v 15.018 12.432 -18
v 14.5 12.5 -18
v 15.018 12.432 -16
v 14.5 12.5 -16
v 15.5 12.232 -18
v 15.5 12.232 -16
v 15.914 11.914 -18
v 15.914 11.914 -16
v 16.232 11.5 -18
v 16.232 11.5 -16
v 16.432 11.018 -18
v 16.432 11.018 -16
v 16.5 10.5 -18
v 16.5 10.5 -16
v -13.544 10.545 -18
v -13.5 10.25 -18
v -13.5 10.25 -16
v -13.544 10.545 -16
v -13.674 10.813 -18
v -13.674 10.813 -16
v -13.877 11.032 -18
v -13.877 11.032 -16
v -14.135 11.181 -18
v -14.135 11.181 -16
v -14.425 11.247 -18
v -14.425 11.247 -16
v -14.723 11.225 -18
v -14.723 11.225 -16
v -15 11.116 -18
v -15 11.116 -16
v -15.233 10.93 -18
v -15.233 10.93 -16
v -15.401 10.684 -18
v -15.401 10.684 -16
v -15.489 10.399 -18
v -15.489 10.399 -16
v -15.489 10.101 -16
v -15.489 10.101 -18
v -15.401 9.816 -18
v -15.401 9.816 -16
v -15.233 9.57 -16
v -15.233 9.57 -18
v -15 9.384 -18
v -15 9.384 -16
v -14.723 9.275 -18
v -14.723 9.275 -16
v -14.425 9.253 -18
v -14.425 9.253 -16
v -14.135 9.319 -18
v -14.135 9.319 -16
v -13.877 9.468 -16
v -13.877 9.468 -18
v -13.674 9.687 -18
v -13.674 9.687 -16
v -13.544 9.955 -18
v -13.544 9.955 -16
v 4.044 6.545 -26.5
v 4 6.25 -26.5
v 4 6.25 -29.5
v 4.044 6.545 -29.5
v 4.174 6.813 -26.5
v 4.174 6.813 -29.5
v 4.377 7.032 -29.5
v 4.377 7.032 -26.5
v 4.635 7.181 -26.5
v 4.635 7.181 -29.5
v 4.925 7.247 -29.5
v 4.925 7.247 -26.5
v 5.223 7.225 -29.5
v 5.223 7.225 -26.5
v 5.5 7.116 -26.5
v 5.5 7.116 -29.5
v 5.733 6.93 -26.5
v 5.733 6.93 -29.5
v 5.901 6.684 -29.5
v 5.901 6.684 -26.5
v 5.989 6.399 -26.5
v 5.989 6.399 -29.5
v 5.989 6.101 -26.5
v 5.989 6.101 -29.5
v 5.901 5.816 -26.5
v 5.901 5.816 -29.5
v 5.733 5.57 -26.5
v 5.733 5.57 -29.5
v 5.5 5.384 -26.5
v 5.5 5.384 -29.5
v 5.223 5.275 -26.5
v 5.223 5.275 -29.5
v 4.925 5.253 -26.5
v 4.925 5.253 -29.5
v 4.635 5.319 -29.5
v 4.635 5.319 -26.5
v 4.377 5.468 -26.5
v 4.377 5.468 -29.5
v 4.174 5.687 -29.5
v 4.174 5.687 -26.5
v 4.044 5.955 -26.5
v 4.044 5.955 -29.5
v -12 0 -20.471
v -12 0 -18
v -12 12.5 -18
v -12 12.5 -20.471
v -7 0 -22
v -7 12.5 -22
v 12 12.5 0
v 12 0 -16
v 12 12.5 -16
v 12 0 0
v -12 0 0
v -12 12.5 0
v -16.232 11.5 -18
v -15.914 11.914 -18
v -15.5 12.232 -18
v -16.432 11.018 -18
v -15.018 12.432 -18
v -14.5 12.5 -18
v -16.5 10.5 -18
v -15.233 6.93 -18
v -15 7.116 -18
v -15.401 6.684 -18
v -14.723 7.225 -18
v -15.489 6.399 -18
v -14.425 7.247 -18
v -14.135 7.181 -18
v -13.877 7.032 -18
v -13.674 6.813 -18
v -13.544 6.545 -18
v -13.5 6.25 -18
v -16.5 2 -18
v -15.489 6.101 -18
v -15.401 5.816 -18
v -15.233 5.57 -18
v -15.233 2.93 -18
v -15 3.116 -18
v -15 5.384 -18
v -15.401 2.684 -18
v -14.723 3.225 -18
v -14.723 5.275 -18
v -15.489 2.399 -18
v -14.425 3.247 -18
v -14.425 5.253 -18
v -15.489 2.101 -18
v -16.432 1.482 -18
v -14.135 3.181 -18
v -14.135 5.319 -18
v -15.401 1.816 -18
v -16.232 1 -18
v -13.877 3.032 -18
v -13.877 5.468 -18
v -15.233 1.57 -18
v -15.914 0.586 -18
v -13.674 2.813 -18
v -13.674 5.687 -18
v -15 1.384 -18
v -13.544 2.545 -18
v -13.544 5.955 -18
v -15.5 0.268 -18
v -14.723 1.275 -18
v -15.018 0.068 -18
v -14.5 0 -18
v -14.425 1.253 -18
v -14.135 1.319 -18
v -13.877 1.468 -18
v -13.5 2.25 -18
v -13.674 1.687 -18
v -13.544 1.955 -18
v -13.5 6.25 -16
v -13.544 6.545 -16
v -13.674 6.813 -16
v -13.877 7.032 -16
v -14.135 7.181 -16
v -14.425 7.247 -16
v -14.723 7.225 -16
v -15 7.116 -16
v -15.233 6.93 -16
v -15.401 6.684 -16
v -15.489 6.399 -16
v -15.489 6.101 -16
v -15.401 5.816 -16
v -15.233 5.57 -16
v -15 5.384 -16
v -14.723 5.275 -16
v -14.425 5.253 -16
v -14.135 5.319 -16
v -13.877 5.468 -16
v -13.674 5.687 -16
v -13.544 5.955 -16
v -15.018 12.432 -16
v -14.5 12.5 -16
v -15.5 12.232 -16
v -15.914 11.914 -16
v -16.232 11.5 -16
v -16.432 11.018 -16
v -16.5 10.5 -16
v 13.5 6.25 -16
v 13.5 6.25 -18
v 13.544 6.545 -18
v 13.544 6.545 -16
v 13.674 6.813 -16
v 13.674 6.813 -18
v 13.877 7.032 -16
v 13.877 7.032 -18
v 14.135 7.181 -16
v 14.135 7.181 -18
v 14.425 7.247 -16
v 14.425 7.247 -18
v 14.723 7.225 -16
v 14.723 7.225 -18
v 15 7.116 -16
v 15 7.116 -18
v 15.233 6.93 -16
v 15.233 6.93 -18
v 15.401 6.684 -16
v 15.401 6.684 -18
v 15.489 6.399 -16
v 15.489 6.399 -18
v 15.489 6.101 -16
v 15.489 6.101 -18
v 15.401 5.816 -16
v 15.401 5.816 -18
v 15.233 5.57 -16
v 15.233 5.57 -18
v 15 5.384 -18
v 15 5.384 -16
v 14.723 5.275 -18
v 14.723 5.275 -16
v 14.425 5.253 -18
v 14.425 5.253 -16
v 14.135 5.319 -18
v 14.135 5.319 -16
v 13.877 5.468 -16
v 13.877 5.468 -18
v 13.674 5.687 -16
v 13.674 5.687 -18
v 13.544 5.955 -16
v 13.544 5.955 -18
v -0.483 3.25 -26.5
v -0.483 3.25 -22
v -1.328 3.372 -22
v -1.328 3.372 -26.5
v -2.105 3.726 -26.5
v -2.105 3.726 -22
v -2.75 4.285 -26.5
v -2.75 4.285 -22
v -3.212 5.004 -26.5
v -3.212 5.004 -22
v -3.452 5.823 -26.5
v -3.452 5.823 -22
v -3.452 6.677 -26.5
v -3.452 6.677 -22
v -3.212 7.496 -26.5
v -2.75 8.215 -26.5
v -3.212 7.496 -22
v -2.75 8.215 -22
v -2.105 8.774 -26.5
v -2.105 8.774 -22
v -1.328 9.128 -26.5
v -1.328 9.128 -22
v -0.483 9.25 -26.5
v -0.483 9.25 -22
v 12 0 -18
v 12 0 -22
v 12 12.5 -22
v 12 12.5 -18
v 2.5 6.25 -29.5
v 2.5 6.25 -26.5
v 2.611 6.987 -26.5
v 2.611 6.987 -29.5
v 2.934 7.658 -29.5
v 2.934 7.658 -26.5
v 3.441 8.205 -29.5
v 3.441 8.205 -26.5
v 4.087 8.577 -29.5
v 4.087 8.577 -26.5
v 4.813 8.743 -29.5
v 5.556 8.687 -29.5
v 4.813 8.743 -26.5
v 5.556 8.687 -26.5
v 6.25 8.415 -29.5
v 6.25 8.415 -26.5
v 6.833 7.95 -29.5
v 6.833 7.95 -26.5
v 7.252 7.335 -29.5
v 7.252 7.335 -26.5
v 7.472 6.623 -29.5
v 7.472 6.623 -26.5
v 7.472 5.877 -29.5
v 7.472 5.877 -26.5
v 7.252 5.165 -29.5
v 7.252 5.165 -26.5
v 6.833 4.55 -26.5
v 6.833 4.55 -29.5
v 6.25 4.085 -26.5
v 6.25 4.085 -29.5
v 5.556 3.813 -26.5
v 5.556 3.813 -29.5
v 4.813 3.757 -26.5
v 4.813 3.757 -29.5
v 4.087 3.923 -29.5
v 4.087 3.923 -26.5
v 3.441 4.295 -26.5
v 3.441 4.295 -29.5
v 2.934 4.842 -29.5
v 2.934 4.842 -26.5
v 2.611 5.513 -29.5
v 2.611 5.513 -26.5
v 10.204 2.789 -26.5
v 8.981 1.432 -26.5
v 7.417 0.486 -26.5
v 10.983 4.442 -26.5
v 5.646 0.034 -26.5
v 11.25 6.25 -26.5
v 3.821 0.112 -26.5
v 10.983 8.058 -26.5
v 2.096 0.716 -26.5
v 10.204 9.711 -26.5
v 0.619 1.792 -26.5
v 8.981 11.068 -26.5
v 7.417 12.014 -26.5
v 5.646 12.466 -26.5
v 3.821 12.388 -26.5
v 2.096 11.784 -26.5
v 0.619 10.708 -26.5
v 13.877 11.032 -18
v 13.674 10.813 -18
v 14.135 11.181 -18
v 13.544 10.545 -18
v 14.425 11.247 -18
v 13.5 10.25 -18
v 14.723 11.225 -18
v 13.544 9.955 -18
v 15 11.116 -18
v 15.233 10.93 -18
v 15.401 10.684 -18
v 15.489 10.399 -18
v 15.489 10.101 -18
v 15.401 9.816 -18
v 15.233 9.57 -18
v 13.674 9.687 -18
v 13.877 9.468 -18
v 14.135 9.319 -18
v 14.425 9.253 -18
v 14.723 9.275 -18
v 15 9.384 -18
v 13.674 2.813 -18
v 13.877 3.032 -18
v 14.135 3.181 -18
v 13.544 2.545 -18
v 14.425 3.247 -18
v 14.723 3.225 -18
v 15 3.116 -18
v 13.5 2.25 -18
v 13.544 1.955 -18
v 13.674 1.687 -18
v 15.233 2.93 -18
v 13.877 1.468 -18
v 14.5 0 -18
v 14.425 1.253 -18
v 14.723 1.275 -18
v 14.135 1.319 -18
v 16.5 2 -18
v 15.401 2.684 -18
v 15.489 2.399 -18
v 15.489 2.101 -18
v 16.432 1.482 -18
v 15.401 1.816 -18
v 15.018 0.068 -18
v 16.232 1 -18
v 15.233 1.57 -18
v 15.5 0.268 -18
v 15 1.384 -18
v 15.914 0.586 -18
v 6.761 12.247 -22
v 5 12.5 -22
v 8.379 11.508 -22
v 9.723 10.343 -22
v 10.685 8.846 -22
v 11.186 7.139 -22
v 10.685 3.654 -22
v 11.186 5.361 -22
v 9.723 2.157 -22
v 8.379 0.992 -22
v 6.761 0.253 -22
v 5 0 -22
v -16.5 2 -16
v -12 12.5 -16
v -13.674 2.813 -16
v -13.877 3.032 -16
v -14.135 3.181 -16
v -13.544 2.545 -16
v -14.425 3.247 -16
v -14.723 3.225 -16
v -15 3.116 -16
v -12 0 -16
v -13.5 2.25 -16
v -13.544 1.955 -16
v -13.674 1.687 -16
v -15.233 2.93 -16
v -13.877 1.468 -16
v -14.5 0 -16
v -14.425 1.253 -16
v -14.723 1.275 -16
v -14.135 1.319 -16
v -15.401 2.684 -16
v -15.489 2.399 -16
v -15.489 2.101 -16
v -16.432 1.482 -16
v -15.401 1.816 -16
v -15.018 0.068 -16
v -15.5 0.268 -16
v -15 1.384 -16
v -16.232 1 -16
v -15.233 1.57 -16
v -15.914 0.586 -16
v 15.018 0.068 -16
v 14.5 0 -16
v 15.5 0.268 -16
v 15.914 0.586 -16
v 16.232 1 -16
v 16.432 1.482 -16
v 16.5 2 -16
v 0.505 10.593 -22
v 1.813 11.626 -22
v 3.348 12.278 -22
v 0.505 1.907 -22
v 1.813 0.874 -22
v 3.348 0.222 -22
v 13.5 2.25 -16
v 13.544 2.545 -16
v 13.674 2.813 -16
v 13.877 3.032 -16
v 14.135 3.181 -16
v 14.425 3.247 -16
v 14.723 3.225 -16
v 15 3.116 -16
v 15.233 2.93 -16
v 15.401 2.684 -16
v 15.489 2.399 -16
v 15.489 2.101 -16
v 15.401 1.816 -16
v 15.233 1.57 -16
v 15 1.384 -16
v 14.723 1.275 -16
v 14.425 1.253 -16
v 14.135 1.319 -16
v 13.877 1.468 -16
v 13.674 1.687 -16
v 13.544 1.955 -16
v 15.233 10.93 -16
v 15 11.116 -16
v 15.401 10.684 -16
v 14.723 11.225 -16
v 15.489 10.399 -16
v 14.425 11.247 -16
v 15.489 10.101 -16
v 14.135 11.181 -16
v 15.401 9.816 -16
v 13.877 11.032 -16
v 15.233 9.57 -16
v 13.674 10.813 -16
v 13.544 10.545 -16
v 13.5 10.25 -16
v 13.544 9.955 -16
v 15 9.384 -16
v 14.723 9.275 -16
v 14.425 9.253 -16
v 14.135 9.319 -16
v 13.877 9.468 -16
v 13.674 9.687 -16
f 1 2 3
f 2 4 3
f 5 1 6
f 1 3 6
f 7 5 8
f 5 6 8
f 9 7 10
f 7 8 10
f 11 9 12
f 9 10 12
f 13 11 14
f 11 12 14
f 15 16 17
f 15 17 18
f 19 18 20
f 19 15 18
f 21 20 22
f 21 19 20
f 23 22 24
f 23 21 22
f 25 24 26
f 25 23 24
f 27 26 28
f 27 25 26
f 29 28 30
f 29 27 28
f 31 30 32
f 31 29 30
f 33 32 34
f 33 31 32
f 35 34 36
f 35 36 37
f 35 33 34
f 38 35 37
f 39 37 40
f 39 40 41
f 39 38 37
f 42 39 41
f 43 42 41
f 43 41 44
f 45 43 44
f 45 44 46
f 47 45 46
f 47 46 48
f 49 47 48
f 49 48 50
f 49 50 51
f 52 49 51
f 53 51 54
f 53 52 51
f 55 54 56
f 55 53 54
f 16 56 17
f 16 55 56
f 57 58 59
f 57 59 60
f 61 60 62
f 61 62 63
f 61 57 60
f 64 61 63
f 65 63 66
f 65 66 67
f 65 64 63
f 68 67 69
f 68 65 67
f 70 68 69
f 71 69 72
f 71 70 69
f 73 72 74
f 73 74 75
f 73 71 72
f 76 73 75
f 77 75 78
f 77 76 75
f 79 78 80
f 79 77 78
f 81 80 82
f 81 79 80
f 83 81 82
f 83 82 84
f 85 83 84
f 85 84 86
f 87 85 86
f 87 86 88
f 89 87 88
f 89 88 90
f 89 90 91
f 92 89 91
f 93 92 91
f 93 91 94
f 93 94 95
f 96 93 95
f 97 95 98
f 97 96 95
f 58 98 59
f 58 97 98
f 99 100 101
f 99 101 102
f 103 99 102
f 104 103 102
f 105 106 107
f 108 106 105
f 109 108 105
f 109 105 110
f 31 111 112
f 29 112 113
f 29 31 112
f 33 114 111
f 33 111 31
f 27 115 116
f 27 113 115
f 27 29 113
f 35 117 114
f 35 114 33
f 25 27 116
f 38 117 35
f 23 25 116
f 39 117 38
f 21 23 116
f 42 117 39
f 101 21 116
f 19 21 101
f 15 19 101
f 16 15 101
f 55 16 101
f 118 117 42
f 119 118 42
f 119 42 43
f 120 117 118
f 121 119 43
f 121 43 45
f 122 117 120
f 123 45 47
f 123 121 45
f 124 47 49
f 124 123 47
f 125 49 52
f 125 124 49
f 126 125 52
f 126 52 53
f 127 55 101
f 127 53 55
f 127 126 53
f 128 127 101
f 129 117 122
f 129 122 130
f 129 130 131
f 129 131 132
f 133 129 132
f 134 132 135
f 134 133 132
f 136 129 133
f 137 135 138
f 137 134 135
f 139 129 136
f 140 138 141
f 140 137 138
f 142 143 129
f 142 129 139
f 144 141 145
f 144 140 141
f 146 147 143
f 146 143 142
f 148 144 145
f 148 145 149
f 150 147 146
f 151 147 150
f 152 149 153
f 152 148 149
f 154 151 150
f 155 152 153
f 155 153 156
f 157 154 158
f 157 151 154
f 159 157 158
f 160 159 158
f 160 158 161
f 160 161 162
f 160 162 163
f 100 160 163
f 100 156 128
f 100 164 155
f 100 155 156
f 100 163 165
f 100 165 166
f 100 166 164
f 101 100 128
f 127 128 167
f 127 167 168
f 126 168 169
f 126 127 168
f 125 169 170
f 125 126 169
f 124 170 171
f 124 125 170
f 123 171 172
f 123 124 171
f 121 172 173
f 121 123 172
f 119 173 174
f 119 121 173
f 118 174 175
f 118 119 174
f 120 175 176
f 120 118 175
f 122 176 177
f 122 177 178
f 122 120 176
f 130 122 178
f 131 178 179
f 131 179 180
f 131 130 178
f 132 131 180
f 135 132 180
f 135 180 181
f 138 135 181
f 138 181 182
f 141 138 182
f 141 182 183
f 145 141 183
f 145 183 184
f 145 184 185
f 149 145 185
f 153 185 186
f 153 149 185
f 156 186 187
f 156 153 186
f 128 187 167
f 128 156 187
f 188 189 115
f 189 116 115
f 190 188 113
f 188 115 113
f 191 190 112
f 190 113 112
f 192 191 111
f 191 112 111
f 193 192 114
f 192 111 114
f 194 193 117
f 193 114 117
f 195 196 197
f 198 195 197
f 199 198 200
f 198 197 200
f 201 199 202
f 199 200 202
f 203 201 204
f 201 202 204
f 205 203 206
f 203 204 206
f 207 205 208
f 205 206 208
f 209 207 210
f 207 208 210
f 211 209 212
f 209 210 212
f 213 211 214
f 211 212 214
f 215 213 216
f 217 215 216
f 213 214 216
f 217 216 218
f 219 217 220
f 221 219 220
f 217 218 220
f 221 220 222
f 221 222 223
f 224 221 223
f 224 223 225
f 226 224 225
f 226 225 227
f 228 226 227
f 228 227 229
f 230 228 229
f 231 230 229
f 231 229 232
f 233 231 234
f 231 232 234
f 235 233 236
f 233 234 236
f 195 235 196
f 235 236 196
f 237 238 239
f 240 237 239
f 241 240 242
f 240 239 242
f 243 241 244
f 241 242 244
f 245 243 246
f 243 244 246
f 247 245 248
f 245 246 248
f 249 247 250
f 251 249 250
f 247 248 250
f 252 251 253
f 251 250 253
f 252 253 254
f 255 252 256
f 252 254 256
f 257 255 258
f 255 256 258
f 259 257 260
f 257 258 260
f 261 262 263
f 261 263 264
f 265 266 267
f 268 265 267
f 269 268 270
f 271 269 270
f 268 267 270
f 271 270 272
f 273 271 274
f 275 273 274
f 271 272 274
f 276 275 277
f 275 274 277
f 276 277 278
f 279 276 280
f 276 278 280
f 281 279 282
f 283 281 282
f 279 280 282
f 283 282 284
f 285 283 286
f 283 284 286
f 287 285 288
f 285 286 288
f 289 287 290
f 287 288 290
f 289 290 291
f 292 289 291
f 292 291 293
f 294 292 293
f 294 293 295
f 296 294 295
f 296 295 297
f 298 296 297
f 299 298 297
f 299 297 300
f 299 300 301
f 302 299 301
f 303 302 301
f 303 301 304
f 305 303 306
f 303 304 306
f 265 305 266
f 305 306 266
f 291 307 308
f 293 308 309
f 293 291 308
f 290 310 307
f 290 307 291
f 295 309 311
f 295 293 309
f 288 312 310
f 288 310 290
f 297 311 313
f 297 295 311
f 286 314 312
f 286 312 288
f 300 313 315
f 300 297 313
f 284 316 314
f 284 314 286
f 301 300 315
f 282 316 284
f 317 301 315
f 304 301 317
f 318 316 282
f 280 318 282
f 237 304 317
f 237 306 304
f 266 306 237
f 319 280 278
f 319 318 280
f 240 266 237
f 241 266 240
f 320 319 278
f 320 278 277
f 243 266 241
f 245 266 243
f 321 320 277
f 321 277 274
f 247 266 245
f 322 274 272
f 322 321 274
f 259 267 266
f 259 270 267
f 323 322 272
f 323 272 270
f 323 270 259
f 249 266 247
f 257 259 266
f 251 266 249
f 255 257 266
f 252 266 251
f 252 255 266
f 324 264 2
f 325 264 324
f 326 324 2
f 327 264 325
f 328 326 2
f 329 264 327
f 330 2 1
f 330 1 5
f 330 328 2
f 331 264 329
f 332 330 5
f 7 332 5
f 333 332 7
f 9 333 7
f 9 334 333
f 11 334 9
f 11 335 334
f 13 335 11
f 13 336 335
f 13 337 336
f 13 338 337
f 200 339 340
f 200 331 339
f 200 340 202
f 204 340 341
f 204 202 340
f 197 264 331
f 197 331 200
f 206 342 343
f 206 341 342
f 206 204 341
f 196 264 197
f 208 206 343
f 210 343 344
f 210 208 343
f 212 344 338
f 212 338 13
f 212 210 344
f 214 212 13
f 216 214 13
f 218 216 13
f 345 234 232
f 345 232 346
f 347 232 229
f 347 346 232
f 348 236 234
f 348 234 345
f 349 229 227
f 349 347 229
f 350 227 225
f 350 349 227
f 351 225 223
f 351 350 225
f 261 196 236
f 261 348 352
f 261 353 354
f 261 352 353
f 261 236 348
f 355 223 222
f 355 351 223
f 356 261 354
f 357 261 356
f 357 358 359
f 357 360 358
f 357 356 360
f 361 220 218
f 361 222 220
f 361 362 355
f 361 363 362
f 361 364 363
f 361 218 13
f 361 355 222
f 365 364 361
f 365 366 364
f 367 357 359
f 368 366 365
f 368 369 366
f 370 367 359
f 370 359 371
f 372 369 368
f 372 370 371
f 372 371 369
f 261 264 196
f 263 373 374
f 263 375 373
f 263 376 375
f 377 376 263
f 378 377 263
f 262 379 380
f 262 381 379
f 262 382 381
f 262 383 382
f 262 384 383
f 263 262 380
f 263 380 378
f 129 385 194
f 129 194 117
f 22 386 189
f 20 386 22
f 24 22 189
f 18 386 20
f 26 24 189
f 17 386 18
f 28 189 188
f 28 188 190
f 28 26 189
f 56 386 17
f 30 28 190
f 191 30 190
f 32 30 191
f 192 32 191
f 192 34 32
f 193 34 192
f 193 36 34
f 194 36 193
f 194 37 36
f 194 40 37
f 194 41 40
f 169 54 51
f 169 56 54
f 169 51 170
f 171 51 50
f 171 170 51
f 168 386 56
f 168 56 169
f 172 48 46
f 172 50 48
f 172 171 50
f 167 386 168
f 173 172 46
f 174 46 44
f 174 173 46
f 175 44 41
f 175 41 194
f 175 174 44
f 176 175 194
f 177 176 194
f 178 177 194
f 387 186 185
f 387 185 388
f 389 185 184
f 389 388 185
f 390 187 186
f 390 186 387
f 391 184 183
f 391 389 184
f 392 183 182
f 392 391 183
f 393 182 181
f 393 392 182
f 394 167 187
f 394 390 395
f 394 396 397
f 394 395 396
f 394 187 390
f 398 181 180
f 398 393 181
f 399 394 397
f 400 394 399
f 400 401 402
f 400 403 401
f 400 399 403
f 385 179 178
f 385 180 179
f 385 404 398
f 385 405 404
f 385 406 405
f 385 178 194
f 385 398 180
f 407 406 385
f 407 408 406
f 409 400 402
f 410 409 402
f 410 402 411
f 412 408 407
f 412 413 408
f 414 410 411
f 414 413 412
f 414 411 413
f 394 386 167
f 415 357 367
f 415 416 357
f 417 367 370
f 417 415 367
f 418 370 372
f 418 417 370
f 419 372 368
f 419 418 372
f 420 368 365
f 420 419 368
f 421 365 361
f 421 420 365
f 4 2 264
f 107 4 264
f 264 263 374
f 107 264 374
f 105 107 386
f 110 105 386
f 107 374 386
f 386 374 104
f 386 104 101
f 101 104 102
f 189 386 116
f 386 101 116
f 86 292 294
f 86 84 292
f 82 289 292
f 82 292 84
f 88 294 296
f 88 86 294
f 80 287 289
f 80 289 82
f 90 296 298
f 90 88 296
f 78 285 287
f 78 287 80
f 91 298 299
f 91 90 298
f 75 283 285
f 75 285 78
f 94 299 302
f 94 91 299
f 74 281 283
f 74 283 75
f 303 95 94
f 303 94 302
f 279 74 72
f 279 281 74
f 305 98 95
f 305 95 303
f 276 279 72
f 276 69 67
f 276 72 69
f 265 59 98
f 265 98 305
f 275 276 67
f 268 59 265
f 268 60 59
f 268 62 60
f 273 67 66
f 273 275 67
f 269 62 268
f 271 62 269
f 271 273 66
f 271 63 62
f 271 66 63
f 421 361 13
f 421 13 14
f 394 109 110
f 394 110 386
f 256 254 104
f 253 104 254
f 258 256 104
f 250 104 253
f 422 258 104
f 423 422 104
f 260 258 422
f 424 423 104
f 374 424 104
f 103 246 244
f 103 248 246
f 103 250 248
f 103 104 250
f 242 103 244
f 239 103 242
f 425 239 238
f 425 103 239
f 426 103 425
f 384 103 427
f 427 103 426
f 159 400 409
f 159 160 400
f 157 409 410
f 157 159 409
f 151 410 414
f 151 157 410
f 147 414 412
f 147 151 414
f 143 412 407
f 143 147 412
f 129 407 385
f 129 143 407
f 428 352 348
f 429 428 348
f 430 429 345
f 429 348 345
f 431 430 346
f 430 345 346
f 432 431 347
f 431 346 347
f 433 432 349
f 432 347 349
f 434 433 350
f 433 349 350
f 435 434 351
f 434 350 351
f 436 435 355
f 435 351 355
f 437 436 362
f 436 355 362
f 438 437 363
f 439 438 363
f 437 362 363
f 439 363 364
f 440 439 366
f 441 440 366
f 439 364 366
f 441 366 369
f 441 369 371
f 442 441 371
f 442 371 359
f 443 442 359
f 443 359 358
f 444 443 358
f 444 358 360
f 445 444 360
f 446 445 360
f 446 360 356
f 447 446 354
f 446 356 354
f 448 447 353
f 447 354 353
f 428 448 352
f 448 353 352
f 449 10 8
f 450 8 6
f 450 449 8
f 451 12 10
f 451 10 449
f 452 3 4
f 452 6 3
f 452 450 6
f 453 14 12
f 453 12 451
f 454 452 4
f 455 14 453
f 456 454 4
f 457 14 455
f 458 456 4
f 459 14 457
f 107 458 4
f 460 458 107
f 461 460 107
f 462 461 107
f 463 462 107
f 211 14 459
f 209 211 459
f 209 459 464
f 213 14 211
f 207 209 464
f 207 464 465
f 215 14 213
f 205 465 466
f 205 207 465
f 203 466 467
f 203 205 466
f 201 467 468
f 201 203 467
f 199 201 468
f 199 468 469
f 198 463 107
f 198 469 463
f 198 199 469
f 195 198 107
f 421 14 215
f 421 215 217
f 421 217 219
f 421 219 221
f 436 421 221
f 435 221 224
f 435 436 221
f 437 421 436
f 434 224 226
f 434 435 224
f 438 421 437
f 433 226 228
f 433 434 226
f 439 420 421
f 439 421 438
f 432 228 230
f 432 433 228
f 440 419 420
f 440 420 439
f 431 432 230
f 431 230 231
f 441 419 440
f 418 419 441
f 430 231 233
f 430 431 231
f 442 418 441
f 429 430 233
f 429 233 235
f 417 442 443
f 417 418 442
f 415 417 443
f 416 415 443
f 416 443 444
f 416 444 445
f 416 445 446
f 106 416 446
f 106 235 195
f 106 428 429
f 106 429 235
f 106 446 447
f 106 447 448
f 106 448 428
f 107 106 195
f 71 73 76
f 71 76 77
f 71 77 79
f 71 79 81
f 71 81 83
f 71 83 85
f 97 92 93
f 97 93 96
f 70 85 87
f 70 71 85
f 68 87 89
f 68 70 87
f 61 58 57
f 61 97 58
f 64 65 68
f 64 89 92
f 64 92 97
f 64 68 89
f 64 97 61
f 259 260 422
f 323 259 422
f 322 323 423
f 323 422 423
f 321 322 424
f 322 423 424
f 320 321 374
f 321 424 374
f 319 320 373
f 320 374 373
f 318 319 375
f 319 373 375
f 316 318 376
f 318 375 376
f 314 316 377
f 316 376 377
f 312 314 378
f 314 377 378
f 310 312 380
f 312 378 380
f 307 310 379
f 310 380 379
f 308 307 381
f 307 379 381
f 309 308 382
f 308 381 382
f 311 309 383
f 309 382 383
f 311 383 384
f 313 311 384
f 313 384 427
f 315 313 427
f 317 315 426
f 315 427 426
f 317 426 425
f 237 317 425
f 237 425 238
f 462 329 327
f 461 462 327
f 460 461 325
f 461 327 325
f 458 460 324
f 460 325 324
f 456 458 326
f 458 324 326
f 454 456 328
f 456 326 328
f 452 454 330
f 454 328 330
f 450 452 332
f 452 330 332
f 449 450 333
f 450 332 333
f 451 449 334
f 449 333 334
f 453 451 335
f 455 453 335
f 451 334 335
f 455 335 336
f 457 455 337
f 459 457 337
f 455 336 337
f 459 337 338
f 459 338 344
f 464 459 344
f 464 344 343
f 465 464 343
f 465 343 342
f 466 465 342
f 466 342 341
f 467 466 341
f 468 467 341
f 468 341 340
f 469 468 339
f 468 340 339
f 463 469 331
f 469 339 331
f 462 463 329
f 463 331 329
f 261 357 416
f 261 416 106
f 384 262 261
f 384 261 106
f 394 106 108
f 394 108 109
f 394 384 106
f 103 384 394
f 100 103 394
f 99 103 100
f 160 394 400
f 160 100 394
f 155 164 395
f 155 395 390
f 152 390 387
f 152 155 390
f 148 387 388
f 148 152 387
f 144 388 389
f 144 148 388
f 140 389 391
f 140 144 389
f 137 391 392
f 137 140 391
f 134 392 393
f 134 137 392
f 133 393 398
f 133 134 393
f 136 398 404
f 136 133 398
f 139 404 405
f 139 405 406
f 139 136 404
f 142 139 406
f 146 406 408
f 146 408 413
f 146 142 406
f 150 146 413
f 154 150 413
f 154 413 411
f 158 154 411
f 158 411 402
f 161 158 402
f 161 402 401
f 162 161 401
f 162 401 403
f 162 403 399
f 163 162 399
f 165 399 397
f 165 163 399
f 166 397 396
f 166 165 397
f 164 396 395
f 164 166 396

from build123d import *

# Parameters (mm, degrees)
BOSS_EXTRUDE1_DEPTH = 12.5
SKETCH2_R           = 3
SKETCH2_R_2         = 6.25
BOSS_EXTRUDE2_DEPTH = 4.5
SKETCH3_R           = 2.5
SKETCH3_R_2         = 1
BOSS_EXTRUDE3_DEPTH = 3
SKETCH4_R           = 1
CUT_EXTRUDE1_DEPTH  = 2
FILLET1_R           = 2
CHAMFER1_SIZE       = 5
CHAMFER1_SIZE2      = 1.528653407


with BuildPart() as part:
    # Sketch1 → Boss-Extrude1 (new body)
    with BuildSketch(Plane(origin=(0, 0, 0), x_dir=(1, 0, 0), z_dir=(0, 1, 0))):
        Polygon((-12, 0), (-12, 16), (-16.5, 16), (-16.5, 18), (-12, 18), (-12, 22), (12, 22), (12, 18), (16.5, 18), (16.5, 16), (12, 16), (12, 0), align=None)
    extrude(amount=BOSS_EXTRUDE1_DEPTH)

    # Sketch2 → Boss-Extrude2 (add)
    with BuildSketch(Plane(origin=(0, 0, -22), x_dir=(-1, 0, 0), z_dir=(0, 0, -1))):
        with Locations((0.48292805, 6.25)):
            Circle(SKETCH2_R)
        with Locations((-5, 6.25)):
            Circle(SKETCH2_R_2)
    extrude(amount=BOSS_EXTRUDE2_DEPTH)

    # Sketch3 → Boss-Extrude3 (add)
    with BuildSketch(Plane(origin=(0, 0, -26.5), x_dir=(-1, 0, 0), z_dir=(0, 0, -1))):
        with Locations((-5, 6.25)):
            Circle(SKETCH3_R)
        with Locations((-5, 6.25)):
            Circle(SKETCH3_R_2, mode=Mode.SUBTRACT)
    extrude(amount=BOSS_EXTRUDE3_DEPTH)

    # Sketch4 → Cut-Extrude1 (cut)
    with BuildSketch(Plane(origin=(0, 0, -18), x_dir=(-1, 0, 0), z_dir=(0, 0, -1))):
        with Locations((-14.5, 6.25)):
            Circle(SKETCH4_R)
        with Locations((-14.5, 10.25)):
            Circle(SKETCH4_R)
        with Locations((-14.5, 2.25)):
            Circle(SKETCH4_R)
    cut_extrude1 = extrude(amount=-CUT_EXTRUDE1_DEPTH, mode=Mode.SUBTRACT)

    # Mirror1: Cut-Extrude1 across plane
    add(cut_extrude1.mirror(Plane(origin=(0, 0, 0), x_dir=(0, 0, 1), z_dir=(1, 0, 0))), mode=Mode.SUBTRACT)

    # Fillet1
    fillet1_edges = [part.edges().sort_by_distance(p)[0] for p in [
        (-16.5, 0, -17),
        (16.5, 12.5, -17),
        (16.5, 0, -17),
        (-16.5, 12.5, -17),
    ]]
    fillet(fillet1_edges, radius=FILLET1_R)

    # Chamfer1
    chamfer1_edges = [part.edges().sort_by_distance(p)[0] for p in [
        (-12, 6.25, -22),
    ]]
    chamfer1_side = [part.faces().sort_by_distance(p)[0] for p in [
        (-6.176633795, 6.25, -22),
    ]]
    chamfer(chamfer1_edges, length=CHAMFER1_SIZE, length2=CHAMFER1_SIZE2, reference=chamfer1_side[0])


solid = part.part
